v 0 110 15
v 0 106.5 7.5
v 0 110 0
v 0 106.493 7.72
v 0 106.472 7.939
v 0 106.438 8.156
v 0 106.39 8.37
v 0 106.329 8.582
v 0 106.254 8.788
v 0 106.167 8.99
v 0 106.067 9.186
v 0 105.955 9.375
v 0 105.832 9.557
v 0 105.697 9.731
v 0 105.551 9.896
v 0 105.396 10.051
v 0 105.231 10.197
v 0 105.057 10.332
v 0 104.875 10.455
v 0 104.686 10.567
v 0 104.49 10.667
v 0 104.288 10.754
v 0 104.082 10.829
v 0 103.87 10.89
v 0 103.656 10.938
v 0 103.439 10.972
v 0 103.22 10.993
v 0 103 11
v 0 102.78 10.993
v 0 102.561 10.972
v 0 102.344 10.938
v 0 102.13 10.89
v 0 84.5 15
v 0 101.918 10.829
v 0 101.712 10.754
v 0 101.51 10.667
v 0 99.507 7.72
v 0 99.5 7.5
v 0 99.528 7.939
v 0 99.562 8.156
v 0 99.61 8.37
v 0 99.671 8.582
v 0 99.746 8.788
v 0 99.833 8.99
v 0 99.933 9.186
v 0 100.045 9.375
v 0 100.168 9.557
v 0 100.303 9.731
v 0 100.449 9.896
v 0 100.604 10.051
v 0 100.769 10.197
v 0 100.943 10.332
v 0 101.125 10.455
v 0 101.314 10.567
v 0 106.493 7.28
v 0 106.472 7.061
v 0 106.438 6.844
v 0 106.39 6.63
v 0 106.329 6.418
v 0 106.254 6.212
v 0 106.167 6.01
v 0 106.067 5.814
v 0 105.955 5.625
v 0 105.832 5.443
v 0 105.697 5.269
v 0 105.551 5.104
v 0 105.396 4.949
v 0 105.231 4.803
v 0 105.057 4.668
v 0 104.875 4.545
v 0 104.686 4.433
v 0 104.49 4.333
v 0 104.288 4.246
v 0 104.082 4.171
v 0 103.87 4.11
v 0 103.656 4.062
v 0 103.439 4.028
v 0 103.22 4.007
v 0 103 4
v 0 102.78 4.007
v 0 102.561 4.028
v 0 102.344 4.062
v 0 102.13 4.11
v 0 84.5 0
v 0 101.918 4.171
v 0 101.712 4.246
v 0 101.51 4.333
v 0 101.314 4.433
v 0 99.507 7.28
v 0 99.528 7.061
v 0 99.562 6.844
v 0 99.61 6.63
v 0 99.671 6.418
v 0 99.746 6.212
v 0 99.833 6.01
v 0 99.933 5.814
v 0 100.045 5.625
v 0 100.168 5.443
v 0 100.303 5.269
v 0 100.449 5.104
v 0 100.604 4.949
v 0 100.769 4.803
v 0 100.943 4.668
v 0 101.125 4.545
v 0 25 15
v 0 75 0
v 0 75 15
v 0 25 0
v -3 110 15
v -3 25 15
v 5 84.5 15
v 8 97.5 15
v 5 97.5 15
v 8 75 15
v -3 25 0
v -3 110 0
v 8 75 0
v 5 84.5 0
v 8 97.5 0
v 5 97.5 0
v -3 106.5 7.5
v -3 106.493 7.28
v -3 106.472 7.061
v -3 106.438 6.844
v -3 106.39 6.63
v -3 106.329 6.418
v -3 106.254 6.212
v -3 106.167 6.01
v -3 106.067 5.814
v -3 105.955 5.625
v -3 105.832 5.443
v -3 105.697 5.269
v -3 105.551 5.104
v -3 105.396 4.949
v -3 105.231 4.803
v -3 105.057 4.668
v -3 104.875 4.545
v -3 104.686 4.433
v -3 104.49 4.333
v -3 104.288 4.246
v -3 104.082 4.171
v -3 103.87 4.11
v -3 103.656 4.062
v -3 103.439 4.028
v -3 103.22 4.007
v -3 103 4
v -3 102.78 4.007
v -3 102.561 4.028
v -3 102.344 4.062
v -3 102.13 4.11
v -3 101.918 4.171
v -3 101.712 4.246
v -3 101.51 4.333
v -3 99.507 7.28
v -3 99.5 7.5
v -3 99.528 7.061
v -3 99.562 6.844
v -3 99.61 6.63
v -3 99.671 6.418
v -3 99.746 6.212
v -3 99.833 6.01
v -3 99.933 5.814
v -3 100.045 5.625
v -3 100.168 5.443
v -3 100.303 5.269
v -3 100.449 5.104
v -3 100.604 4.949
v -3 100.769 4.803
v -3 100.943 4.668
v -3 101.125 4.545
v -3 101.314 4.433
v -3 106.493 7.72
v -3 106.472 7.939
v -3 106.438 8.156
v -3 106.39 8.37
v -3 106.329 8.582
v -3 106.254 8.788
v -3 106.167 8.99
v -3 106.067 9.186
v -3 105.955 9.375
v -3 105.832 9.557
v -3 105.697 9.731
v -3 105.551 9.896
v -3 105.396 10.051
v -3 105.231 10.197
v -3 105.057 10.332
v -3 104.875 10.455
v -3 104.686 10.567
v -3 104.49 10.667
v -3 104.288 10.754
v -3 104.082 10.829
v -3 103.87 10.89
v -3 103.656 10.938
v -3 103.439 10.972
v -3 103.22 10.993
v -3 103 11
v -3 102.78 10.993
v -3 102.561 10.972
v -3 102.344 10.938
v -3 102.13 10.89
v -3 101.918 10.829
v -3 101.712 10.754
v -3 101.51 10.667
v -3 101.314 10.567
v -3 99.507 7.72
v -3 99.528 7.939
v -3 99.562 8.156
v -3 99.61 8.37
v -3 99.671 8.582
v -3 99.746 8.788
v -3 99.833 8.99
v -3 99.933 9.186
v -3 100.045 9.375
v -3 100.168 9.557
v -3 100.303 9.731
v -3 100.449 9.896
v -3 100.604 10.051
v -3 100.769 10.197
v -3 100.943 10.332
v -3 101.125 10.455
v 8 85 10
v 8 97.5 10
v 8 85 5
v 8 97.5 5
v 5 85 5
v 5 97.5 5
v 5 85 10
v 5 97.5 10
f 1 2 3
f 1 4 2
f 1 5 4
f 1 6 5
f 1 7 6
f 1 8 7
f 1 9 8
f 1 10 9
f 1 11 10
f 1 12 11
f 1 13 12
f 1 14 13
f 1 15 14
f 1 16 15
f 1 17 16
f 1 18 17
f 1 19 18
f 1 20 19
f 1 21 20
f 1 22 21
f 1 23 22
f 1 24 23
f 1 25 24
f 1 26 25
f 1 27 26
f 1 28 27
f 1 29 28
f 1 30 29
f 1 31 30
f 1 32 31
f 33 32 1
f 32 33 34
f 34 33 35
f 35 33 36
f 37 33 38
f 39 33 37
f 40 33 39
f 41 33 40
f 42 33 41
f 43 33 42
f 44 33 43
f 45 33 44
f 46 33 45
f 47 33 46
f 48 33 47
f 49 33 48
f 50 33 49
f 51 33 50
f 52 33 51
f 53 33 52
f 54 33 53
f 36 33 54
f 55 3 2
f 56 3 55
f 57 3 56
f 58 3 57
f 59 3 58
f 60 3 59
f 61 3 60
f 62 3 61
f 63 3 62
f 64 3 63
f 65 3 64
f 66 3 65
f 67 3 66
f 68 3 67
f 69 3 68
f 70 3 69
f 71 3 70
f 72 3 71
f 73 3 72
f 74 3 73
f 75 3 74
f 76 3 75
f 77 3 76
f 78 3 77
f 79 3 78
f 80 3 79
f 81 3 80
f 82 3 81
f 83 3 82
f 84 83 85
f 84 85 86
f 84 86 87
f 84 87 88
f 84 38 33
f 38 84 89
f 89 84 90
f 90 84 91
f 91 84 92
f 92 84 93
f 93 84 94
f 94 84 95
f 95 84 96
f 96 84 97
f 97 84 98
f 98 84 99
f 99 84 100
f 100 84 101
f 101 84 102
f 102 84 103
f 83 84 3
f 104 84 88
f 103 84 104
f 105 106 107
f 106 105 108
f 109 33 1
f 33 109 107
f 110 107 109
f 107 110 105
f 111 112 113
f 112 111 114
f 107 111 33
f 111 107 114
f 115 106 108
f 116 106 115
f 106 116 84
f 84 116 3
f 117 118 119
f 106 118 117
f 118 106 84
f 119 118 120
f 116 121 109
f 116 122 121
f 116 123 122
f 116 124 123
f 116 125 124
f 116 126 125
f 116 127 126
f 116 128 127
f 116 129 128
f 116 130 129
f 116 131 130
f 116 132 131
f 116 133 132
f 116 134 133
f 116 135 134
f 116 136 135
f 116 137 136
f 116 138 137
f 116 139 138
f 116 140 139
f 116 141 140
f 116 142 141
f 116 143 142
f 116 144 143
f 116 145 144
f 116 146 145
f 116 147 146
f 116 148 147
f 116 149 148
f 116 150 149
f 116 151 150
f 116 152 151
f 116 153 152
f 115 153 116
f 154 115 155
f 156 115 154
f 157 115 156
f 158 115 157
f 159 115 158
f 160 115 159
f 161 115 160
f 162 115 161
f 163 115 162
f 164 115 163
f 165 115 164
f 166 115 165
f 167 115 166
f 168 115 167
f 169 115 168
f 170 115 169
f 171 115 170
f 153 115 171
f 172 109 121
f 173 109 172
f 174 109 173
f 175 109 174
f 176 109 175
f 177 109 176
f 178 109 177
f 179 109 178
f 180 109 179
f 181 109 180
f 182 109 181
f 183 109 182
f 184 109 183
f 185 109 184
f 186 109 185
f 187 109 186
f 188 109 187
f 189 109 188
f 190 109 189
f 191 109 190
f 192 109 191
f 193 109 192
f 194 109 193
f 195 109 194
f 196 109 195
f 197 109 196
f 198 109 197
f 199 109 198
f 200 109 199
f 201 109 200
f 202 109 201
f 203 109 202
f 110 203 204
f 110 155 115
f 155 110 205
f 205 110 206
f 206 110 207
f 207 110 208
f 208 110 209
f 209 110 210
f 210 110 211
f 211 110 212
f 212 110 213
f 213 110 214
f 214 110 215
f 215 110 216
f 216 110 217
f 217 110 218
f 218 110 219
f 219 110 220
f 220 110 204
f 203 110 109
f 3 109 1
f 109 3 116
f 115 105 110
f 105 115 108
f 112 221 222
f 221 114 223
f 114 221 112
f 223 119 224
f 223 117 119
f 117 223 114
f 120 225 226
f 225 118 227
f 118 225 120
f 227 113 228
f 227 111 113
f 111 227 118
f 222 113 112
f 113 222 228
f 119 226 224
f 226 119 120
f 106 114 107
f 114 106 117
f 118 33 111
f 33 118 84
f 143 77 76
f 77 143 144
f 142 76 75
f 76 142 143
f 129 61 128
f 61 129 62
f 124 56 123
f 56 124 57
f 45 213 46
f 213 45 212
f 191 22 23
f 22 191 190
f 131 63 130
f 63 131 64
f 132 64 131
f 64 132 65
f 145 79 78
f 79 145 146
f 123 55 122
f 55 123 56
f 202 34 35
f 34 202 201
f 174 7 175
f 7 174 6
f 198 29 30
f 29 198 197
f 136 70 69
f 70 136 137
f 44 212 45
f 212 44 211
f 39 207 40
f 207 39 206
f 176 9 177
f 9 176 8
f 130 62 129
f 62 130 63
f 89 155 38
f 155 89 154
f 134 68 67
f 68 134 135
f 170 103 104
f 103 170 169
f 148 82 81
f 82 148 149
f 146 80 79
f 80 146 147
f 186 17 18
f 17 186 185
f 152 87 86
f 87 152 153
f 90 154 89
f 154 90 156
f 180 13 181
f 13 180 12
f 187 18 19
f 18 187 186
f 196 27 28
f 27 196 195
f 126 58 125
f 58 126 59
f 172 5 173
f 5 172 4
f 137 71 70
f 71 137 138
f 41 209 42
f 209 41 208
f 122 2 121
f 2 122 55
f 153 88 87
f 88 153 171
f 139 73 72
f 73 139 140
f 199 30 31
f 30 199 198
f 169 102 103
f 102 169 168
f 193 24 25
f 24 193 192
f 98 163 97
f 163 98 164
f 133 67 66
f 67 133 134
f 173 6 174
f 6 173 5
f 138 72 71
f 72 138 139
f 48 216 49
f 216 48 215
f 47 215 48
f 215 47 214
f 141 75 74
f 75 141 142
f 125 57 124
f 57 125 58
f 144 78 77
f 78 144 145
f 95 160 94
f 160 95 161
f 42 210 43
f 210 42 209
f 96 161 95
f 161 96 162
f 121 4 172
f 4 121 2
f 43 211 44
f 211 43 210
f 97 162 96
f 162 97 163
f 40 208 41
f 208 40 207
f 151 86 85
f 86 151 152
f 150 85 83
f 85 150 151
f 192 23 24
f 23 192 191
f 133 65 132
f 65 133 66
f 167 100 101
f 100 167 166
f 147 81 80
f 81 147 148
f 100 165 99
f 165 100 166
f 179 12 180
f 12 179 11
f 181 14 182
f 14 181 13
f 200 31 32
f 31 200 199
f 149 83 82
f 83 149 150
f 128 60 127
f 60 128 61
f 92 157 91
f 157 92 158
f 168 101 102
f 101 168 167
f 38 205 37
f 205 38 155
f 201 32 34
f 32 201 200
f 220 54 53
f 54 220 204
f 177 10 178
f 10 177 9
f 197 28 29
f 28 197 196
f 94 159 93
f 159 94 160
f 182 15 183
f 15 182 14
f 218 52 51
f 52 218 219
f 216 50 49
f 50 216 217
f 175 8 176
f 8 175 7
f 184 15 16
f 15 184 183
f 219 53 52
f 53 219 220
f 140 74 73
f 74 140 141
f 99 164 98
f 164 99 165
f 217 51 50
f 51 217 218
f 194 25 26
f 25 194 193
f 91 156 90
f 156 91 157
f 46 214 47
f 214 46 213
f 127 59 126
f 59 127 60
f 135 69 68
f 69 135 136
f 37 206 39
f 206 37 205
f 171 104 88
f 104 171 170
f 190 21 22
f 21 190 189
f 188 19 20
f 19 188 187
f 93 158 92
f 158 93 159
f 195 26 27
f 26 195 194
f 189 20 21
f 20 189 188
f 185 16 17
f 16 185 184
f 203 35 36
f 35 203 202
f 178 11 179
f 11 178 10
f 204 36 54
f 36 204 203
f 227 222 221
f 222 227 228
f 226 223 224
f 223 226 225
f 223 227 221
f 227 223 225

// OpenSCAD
difference(){
	union(){
/*        
        translate([-8,-3,0]){
           cube([57,3,15], center=false);
        }
        translate([0,0,0]){
           cube([41,35,3], center=false);
        }
        translate([0,0,0]){
          cube([3,35,15], center=false);
        }      
*/
        translate([-3,25,0]){
          cube([3,85,15], center=false);
        }      
        translate([0+5,25+50,0]){
          cube([3,85-7.5-50-5,15], center=false);
        }      
        translate([0,25+50,0]){
          cube([5,85-7.5-18-50,15], center=false);
        }      
/*

        translate([38,0,0]){
          cube([3,35,15], center=false);
        }      
        
        translate([38-16,30,0]){
          cube([8,5,15], center=false);
        }      
        translate([22,0,0]){
          cube([8,7,15], center=false);
        }      

        translate([2,30,0]){
          cube([8,5,8], center=false);
        }      
        translate([2,2,0]){
          cube([8,5,10], center=false);
        }      
        */

	}
	union() {
       translate([0,103,7.5]){
            rotate(a = [0,90,0]) {
                cylinder(h=600, r=3.5, $fn=100, center=true);
            }
       }	
        translate([4,25+50+10,5]){
          cube([7,85-7.5-18-40,5], center=false);
        }      
     

/*
       translate([0,24,3+6]){
            rotate(a = [0,90,0]) {
                cylinder(h=600, r=1, $fn=100, center=true);
            }
       }			   
       translate([26,3.5,0]){
            rotate(a = [0,0,90]) {
                cylinder(h=600, r=1, $fn=100, center=true);
            }
       }			   
       translate([26,35-2.5,0]){
            rotate(a = [0,0,90]) {
                cylinder(h=600, r=1, $fn=100, center=true);
            }
       }	
         translate([-4,0,7.5]){
            rotate(a = [90,0,0]) {
                cylinder(h=600, r=1, $fn=100, center=true);
            }
       }			   
       translate([57-4-8,0,7.5]){
            rotate(a = [90,0,0]) {
                cylinder(h=600, r=1, $fn=100, center=true);
            }
       }			   
       translate([30,21,-4]){
          cube([8,15,8], center=false);
        }      
*/
        
	}
}
